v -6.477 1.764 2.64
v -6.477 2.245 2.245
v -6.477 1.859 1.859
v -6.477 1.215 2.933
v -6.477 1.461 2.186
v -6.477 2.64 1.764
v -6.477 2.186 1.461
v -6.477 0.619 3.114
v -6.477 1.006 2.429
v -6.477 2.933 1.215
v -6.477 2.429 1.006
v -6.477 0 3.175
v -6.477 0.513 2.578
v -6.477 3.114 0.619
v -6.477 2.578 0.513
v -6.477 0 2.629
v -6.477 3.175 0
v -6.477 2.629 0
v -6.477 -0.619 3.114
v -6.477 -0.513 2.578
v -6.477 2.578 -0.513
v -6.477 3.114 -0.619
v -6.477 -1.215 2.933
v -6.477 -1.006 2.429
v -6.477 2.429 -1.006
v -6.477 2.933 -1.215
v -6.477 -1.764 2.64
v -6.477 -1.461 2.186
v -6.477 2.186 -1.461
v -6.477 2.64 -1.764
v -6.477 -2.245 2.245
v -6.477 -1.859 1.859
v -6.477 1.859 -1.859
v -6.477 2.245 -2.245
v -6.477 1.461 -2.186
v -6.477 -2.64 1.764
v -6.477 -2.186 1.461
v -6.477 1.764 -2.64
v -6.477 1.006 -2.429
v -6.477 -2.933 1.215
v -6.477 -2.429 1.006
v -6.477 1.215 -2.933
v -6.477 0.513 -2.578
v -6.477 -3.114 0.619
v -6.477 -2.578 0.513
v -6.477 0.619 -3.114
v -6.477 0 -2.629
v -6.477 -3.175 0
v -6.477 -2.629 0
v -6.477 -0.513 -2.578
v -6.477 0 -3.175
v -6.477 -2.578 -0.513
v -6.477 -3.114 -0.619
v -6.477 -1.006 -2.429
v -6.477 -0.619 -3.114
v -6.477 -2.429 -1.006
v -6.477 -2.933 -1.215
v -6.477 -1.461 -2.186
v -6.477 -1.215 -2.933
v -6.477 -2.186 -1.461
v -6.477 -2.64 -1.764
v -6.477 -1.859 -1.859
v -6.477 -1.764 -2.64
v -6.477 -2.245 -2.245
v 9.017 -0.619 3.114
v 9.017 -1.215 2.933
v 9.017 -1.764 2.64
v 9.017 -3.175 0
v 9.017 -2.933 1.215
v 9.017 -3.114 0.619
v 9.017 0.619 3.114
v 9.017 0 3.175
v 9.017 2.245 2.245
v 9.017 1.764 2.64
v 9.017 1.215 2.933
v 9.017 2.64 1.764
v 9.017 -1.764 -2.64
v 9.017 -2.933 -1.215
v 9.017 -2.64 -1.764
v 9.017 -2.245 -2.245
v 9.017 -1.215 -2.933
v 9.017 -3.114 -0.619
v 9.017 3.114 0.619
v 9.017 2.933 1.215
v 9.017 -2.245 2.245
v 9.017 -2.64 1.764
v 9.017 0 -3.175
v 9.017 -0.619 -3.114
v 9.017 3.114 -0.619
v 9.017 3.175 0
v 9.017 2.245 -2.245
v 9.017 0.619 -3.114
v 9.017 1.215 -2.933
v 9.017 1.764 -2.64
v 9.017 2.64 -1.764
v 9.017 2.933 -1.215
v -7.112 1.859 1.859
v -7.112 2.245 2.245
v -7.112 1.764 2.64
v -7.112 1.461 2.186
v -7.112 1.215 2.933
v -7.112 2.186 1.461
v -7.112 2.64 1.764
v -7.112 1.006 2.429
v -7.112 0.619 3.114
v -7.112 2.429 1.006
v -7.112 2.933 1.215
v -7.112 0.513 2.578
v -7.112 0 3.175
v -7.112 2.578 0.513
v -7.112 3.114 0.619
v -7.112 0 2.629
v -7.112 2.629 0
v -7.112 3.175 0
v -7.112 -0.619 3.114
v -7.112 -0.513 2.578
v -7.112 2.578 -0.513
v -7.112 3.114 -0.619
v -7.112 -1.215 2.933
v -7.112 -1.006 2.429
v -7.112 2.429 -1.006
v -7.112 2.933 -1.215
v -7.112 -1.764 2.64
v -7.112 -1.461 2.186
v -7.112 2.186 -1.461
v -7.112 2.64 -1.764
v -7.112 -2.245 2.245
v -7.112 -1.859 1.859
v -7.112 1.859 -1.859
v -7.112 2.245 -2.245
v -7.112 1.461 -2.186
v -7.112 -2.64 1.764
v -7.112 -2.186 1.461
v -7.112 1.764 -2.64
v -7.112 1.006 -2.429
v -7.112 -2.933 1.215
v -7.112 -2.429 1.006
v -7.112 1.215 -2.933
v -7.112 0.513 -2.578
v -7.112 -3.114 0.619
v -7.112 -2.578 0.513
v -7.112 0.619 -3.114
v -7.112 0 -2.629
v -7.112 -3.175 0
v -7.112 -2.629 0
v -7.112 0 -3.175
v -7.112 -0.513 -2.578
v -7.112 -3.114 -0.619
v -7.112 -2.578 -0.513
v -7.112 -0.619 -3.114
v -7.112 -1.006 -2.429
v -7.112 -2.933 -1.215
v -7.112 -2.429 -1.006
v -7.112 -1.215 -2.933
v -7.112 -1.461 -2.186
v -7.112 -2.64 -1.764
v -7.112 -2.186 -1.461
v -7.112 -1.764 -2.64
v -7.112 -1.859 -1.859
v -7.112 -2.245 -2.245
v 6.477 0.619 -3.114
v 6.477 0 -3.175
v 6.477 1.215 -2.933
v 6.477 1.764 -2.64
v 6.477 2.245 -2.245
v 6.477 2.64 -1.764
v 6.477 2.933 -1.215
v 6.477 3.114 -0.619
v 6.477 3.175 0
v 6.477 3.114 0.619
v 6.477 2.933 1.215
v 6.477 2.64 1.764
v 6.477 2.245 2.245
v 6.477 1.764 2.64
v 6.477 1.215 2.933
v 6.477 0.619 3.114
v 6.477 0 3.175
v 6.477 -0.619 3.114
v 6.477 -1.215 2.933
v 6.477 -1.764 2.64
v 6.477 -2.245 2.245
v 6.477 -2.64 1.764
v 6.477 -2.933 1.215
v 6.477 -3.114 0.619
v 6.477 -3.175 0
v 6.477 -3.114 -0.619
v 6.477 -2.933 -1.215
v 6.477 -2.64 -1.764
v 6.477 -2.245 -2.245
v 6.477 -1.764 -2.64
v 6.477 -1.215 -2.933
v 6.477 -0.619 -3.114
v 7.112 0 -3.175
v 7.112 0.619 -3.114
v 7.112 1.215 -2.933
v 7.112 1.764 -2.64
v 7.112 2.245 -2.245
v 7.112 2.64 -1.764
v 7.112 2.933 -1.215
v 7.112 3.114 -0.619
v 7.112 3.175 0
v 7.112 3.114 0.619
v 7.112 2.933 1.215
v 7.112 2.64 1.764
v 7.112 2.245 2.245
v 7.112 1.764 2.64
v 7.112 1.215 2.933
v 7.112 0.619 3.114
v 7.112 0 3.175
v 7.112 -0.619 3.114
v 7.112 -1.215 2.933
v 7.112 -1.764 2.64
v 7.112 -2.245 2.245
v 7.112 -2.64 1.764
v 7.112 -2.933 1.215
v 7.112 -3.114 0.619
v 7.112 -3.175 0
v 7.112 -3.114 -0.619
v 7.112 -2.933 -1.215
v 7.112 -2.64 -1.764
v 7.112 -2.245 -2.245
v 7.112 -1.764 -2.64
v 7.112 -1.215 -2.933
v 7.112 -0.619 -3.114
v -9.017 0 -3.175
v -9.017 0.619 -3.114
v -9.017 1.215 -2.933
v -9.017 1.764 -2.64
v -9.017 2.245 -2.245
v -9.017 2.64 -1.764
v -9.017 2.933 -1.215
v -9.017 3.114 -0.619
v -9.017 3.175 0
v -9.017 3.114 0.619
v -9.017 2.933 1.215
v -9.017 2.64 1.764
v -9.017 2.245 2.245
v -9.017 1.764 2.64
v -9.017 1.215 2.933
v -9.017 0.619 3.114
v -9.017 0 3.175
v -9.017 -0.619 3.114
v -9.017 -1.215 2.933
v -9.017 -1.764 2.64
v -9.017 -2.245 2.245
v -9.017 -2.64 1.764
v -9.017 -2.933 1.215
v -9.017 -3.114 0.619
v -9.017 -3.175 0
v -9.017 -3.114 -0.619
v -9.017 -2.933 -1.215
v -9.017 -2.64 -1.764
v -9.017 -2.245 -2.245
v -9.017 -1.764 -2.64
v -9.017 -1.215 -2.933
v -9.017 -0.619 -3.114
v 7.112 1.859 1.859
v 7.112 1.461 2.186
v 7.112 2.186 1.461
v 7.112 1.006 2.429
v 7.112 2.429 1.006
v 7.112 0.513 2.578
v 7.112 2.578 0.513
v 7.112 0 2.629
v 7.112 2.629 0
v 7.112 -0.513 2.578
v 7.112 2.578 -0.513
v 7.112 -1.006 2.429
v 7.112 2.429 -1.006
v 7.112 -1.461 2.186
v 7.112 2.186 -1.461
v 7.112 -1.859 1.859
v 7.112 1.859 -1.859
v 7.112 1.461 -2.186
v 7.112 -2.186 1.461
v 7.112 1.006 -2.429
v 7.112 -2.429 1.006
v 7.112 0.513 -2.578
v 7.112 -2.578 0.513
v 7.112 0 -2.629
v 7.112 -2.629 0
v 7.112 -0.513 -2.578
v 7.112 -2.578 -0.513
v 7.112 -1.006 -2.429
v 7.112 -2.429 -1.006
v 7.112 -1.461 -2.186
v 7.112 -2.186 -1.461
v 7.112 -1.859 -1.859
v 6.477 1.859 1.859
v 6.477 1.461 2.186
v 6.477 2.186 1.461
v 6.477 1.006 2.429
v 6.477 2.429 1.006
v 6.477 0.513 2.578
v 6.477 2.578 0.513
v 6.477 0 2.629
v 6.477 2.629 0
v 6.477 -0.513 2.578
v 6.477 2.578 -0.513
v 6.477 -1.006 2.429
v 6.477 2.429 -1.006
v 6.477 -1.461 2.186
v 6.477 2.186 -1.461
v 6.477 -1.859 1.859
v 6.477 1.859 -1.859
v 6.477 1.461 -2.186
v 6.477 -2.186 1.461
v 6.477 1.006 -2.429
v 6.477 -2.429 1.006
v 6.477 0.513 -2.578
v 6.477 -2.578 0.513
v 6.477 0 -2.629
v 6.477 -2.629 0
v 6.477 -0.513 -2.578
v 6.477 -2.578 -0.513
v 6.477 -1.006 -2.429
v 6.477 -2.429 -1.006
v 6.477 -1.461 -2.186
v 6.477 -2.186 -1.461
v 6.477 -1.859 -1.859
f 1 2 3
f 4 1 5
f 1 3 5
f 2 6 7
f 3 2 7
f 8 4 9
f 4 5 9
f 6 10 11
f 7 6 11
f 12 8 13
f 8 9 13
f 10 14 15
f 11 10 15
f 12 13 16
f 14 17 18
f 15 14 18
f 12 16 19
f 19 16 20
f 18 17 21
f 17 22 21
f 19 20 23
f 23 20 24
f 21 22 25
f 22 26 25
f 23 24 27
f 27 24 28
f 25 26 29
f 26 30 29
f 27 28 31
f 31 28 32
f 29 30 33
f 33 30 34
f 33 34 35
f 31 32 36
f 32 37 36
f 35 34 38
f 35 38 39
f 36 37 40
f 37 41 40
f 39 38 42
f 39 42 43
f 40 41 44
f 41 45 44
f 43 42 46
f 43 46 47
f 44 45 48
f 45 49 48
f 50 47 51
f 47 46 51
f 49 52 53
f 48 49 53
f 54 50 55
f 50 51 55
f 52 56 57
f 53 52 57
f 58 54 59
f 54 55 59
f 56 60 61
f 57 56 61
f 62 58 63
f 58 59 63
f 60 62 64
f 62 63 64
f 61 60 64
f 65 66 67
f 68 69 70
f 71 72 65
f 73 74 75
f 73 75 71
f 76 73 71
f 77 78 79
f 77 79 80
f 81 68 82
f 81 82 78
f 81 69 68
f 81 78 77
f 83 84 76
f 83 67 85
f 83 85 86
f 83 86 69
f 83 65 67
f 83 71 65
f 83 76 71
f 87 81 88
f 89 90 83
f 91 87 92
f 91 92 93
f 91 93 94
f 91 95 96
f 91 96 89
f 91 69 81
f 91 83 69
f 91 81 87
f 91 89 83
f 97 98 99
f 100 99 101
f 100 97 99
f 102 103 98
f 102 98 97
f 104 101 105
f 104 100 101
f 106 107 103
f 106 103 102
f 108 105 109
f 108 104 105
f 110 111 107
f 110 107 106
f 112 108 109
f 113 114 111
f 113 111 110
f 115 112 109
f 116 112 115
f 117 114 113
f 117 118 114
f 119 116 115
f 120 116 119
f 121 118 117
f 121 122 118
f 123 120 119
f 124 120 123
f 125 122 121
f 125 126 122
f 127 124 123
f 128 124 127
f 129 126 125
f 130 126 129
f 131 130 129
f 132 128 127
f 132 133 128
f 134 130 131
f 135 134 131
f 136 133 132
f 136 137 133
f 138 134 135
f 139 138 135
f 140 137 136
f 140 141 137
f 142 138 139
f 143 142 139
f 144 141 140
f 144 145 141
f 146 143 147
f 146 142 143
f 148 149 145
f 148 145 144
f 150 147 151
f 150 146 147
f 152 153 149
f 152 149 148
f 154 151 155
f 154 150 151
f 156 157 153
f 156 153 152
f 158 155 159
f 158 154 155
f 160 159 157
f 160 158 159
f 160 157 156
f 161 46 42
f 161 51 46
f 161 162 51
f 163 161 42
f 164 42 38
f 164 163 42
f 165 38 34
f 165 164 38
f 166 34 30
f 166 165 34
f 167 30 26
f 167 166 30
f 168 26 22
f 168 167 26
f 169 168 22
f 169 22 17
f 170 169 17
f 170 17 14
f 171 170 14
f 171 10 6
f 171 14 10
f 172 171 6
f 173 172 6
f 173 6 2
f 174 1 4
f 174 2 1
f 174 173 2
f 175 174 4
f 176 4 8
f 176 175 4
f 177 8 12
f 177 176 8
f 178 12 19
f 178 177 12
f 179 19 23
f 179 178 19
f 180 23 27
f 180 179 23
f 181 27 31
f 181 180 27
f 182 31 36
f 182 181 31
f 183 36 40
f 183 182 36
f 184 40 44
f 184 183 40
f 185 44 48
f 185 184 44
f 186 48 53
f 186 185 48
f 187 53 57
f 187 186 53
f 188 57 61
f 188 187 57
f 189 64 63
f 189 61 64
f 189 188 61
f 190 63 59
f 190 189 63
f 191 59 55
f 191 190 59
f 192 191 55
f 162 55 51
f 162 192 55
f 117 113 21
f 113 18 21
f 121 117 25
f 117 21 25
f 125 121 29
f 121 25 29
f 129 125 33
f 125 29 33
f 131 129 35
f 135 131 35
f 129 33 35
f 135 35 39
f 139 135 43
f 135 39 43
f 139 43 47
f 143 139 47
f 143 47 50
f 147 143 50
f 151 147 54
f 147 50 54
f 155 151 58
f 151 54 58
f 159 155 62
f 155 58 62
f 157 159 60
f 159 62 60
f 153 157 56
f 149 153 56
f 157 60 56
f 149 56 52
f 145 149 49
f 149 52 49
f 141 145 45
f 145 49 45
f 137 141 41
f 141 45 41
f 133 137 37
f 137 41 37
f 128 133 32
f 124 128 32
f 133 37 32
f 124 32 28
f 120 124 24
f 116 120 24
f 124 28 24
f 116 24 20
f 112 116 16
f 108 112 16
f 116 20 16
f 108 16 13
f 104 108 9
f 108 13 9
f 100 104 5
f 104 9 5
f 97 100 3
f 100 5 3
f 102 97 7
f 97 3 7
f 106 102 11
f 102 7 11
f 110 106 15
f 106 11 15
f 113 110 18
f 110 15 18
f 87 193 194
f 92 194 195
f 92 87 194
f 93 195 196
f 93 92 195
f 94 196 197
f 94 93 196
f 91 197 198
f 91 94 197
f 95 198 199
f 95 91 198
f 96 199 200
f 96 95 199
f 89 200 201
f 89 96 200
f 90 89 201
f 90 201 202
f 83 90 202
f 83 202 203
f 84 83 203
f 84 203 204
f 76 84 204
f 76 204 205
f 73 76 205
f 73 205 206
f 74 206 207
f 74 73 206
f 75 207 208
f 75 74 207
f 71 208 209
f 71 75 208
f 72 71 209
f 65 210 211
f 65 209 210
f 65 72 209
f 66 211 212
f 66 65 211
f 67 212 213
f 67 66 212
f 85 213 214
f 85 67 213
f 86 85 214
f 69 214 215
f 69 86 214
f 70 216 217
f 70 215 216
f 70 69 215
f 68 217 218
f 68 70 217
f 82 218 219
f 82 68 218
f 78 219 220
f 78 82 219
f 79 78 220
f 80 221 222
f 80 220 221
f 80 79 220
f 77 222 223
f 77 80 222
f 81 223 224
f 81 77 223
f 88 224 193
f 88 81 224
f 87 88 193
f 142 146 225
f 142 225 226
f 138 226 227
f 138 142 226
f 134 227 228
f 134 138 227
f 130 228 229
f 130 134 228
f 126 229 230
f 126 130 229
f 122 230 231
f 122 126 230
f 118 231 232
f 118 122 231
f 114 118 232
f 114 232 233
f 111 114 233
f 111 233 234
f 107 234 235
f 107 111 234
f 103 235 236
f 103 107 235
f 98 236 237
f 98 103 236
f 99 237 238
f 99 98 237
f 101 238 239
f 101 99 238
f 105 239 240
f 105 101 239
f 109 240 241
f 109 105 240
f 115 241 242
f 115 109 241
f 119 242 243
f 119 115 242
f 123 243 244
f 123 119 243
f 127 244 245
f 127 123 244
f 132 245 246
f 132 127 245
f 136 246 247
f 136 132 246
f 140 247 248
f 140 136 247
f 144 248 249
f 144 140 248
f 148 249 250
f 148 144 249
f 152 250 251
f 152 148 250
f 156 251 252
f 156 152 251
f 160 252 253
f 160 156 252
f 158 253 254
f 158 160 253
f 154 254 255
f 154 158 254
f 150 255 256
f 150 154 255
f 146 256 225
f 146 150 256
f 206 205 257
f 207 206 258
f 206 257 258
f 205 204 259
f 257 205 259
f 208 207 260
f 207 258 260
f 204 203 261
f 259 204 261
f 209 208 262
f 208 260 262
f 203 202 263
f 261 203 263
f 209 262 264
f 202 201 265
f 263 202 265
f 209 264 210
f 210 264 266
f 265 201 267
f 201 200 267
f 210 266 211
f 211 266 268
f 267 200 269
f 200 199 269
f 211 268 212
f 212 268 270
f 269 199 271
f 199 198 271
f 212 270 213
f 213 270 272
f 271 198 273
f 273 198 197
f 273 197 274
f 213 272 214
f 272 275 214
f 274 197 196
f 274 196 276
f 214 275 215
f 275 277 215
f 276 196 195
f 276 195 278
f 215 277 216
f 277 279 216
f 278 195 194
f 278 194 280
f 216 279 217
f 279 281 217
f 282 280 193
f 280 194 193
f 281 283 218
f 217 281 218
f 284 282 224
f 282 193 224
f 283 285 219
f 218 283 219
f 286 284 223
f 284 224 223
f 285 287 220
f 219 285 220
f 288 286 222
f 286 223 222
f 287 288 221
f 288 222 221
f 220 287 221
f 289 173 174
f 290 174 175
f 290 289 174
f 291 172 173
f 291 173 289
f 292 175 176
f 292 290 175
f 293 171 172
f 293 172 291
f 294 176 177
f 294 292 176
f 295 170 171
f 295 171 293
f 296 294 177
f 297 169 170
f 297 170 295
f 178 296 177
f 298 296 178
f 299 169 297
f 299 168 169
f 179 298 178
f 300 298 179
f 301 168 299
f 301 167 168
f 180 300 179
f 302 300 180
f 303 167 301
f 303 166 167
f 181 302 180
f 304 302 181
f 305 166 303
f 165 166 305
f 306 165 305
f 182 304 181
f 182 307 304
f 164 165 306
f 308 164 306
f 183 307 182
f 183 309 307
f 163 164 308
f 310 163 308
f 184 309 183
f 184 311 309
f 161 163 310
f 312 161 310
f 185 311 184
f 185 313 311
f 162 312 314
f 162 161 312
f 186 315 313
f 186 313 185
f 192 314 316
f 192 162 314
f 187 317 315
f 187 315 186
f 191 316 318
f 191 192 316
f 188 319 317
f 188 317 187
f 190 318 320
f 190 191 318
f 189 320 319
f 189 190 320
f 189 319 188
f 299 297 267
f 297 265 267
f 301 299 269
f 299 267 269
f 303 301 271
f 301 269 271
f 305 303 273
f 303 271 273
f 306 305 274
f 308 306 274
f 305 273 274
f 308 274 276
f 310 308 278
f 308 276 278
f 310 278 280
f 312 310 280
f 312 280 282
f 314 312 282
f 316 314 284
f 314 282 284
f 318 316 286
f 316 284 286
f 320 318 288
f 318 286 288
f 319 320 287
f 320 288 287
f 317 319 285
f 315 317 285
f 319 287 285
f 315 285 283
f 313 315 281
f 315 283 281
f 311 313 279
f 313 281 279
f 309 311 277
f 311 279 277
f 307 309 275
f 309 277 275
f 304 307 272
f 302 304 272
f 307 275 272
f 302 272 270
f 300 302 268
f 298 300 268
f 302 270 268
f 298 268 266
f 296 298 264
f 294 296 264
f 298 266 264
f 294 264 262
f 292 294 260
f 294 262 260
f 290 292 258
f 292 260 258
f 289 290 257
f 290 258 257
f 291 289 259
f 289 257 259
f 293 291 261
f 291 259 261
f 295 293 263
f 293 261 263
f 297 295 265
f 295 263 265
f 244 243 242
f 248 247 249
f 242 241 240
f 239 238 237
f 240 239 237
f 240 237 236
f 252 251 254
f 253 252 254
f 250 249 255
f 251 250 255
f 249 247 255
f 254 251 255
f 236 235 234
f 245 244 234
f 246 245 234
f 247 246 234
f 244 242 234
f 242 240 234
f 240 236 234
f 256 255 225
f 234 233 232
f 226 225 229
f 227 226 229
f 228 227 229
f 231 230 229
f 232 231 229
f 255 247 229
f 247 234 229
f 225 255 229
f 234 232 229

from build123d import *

# Parameters (mm, degrees)
SKETCH1_R      = 3.175
EXTRUDE1_DEPTH = 9.017
SKETCH2_W      = 0.635
SKETCH2_H      = 0.5461


with BuildPart() as part:
    # Sketch1 → Extrude1 (new body, symmetric)
    with BuildSketch(Plane(origin=(0, 0, 0), x_dir=(0, 0, -1), z_dir=(1, 0, 0))):
        Circle(SKETCH1_R)
    extrude(amount=EXTRUDE1_DEPTH, both=True)

    # Sketch2 → Cut-Revolve1 (revolve, cut)
    with BuildSketch(Plane.XY):
        with Locations((-6.7945, 2.90195)):
            Rectangle(SKETCH2_W, SKETCH2_H)
        with Locations((6.7945, 2.90195)):
            Rectangle(SKETCH2_W, SKETCH2_H)
    revolve(axis=Axis((0, 0, 0), (-1, 0, 0)), mode=Mode.SUBTRACT)


solid = part.part
